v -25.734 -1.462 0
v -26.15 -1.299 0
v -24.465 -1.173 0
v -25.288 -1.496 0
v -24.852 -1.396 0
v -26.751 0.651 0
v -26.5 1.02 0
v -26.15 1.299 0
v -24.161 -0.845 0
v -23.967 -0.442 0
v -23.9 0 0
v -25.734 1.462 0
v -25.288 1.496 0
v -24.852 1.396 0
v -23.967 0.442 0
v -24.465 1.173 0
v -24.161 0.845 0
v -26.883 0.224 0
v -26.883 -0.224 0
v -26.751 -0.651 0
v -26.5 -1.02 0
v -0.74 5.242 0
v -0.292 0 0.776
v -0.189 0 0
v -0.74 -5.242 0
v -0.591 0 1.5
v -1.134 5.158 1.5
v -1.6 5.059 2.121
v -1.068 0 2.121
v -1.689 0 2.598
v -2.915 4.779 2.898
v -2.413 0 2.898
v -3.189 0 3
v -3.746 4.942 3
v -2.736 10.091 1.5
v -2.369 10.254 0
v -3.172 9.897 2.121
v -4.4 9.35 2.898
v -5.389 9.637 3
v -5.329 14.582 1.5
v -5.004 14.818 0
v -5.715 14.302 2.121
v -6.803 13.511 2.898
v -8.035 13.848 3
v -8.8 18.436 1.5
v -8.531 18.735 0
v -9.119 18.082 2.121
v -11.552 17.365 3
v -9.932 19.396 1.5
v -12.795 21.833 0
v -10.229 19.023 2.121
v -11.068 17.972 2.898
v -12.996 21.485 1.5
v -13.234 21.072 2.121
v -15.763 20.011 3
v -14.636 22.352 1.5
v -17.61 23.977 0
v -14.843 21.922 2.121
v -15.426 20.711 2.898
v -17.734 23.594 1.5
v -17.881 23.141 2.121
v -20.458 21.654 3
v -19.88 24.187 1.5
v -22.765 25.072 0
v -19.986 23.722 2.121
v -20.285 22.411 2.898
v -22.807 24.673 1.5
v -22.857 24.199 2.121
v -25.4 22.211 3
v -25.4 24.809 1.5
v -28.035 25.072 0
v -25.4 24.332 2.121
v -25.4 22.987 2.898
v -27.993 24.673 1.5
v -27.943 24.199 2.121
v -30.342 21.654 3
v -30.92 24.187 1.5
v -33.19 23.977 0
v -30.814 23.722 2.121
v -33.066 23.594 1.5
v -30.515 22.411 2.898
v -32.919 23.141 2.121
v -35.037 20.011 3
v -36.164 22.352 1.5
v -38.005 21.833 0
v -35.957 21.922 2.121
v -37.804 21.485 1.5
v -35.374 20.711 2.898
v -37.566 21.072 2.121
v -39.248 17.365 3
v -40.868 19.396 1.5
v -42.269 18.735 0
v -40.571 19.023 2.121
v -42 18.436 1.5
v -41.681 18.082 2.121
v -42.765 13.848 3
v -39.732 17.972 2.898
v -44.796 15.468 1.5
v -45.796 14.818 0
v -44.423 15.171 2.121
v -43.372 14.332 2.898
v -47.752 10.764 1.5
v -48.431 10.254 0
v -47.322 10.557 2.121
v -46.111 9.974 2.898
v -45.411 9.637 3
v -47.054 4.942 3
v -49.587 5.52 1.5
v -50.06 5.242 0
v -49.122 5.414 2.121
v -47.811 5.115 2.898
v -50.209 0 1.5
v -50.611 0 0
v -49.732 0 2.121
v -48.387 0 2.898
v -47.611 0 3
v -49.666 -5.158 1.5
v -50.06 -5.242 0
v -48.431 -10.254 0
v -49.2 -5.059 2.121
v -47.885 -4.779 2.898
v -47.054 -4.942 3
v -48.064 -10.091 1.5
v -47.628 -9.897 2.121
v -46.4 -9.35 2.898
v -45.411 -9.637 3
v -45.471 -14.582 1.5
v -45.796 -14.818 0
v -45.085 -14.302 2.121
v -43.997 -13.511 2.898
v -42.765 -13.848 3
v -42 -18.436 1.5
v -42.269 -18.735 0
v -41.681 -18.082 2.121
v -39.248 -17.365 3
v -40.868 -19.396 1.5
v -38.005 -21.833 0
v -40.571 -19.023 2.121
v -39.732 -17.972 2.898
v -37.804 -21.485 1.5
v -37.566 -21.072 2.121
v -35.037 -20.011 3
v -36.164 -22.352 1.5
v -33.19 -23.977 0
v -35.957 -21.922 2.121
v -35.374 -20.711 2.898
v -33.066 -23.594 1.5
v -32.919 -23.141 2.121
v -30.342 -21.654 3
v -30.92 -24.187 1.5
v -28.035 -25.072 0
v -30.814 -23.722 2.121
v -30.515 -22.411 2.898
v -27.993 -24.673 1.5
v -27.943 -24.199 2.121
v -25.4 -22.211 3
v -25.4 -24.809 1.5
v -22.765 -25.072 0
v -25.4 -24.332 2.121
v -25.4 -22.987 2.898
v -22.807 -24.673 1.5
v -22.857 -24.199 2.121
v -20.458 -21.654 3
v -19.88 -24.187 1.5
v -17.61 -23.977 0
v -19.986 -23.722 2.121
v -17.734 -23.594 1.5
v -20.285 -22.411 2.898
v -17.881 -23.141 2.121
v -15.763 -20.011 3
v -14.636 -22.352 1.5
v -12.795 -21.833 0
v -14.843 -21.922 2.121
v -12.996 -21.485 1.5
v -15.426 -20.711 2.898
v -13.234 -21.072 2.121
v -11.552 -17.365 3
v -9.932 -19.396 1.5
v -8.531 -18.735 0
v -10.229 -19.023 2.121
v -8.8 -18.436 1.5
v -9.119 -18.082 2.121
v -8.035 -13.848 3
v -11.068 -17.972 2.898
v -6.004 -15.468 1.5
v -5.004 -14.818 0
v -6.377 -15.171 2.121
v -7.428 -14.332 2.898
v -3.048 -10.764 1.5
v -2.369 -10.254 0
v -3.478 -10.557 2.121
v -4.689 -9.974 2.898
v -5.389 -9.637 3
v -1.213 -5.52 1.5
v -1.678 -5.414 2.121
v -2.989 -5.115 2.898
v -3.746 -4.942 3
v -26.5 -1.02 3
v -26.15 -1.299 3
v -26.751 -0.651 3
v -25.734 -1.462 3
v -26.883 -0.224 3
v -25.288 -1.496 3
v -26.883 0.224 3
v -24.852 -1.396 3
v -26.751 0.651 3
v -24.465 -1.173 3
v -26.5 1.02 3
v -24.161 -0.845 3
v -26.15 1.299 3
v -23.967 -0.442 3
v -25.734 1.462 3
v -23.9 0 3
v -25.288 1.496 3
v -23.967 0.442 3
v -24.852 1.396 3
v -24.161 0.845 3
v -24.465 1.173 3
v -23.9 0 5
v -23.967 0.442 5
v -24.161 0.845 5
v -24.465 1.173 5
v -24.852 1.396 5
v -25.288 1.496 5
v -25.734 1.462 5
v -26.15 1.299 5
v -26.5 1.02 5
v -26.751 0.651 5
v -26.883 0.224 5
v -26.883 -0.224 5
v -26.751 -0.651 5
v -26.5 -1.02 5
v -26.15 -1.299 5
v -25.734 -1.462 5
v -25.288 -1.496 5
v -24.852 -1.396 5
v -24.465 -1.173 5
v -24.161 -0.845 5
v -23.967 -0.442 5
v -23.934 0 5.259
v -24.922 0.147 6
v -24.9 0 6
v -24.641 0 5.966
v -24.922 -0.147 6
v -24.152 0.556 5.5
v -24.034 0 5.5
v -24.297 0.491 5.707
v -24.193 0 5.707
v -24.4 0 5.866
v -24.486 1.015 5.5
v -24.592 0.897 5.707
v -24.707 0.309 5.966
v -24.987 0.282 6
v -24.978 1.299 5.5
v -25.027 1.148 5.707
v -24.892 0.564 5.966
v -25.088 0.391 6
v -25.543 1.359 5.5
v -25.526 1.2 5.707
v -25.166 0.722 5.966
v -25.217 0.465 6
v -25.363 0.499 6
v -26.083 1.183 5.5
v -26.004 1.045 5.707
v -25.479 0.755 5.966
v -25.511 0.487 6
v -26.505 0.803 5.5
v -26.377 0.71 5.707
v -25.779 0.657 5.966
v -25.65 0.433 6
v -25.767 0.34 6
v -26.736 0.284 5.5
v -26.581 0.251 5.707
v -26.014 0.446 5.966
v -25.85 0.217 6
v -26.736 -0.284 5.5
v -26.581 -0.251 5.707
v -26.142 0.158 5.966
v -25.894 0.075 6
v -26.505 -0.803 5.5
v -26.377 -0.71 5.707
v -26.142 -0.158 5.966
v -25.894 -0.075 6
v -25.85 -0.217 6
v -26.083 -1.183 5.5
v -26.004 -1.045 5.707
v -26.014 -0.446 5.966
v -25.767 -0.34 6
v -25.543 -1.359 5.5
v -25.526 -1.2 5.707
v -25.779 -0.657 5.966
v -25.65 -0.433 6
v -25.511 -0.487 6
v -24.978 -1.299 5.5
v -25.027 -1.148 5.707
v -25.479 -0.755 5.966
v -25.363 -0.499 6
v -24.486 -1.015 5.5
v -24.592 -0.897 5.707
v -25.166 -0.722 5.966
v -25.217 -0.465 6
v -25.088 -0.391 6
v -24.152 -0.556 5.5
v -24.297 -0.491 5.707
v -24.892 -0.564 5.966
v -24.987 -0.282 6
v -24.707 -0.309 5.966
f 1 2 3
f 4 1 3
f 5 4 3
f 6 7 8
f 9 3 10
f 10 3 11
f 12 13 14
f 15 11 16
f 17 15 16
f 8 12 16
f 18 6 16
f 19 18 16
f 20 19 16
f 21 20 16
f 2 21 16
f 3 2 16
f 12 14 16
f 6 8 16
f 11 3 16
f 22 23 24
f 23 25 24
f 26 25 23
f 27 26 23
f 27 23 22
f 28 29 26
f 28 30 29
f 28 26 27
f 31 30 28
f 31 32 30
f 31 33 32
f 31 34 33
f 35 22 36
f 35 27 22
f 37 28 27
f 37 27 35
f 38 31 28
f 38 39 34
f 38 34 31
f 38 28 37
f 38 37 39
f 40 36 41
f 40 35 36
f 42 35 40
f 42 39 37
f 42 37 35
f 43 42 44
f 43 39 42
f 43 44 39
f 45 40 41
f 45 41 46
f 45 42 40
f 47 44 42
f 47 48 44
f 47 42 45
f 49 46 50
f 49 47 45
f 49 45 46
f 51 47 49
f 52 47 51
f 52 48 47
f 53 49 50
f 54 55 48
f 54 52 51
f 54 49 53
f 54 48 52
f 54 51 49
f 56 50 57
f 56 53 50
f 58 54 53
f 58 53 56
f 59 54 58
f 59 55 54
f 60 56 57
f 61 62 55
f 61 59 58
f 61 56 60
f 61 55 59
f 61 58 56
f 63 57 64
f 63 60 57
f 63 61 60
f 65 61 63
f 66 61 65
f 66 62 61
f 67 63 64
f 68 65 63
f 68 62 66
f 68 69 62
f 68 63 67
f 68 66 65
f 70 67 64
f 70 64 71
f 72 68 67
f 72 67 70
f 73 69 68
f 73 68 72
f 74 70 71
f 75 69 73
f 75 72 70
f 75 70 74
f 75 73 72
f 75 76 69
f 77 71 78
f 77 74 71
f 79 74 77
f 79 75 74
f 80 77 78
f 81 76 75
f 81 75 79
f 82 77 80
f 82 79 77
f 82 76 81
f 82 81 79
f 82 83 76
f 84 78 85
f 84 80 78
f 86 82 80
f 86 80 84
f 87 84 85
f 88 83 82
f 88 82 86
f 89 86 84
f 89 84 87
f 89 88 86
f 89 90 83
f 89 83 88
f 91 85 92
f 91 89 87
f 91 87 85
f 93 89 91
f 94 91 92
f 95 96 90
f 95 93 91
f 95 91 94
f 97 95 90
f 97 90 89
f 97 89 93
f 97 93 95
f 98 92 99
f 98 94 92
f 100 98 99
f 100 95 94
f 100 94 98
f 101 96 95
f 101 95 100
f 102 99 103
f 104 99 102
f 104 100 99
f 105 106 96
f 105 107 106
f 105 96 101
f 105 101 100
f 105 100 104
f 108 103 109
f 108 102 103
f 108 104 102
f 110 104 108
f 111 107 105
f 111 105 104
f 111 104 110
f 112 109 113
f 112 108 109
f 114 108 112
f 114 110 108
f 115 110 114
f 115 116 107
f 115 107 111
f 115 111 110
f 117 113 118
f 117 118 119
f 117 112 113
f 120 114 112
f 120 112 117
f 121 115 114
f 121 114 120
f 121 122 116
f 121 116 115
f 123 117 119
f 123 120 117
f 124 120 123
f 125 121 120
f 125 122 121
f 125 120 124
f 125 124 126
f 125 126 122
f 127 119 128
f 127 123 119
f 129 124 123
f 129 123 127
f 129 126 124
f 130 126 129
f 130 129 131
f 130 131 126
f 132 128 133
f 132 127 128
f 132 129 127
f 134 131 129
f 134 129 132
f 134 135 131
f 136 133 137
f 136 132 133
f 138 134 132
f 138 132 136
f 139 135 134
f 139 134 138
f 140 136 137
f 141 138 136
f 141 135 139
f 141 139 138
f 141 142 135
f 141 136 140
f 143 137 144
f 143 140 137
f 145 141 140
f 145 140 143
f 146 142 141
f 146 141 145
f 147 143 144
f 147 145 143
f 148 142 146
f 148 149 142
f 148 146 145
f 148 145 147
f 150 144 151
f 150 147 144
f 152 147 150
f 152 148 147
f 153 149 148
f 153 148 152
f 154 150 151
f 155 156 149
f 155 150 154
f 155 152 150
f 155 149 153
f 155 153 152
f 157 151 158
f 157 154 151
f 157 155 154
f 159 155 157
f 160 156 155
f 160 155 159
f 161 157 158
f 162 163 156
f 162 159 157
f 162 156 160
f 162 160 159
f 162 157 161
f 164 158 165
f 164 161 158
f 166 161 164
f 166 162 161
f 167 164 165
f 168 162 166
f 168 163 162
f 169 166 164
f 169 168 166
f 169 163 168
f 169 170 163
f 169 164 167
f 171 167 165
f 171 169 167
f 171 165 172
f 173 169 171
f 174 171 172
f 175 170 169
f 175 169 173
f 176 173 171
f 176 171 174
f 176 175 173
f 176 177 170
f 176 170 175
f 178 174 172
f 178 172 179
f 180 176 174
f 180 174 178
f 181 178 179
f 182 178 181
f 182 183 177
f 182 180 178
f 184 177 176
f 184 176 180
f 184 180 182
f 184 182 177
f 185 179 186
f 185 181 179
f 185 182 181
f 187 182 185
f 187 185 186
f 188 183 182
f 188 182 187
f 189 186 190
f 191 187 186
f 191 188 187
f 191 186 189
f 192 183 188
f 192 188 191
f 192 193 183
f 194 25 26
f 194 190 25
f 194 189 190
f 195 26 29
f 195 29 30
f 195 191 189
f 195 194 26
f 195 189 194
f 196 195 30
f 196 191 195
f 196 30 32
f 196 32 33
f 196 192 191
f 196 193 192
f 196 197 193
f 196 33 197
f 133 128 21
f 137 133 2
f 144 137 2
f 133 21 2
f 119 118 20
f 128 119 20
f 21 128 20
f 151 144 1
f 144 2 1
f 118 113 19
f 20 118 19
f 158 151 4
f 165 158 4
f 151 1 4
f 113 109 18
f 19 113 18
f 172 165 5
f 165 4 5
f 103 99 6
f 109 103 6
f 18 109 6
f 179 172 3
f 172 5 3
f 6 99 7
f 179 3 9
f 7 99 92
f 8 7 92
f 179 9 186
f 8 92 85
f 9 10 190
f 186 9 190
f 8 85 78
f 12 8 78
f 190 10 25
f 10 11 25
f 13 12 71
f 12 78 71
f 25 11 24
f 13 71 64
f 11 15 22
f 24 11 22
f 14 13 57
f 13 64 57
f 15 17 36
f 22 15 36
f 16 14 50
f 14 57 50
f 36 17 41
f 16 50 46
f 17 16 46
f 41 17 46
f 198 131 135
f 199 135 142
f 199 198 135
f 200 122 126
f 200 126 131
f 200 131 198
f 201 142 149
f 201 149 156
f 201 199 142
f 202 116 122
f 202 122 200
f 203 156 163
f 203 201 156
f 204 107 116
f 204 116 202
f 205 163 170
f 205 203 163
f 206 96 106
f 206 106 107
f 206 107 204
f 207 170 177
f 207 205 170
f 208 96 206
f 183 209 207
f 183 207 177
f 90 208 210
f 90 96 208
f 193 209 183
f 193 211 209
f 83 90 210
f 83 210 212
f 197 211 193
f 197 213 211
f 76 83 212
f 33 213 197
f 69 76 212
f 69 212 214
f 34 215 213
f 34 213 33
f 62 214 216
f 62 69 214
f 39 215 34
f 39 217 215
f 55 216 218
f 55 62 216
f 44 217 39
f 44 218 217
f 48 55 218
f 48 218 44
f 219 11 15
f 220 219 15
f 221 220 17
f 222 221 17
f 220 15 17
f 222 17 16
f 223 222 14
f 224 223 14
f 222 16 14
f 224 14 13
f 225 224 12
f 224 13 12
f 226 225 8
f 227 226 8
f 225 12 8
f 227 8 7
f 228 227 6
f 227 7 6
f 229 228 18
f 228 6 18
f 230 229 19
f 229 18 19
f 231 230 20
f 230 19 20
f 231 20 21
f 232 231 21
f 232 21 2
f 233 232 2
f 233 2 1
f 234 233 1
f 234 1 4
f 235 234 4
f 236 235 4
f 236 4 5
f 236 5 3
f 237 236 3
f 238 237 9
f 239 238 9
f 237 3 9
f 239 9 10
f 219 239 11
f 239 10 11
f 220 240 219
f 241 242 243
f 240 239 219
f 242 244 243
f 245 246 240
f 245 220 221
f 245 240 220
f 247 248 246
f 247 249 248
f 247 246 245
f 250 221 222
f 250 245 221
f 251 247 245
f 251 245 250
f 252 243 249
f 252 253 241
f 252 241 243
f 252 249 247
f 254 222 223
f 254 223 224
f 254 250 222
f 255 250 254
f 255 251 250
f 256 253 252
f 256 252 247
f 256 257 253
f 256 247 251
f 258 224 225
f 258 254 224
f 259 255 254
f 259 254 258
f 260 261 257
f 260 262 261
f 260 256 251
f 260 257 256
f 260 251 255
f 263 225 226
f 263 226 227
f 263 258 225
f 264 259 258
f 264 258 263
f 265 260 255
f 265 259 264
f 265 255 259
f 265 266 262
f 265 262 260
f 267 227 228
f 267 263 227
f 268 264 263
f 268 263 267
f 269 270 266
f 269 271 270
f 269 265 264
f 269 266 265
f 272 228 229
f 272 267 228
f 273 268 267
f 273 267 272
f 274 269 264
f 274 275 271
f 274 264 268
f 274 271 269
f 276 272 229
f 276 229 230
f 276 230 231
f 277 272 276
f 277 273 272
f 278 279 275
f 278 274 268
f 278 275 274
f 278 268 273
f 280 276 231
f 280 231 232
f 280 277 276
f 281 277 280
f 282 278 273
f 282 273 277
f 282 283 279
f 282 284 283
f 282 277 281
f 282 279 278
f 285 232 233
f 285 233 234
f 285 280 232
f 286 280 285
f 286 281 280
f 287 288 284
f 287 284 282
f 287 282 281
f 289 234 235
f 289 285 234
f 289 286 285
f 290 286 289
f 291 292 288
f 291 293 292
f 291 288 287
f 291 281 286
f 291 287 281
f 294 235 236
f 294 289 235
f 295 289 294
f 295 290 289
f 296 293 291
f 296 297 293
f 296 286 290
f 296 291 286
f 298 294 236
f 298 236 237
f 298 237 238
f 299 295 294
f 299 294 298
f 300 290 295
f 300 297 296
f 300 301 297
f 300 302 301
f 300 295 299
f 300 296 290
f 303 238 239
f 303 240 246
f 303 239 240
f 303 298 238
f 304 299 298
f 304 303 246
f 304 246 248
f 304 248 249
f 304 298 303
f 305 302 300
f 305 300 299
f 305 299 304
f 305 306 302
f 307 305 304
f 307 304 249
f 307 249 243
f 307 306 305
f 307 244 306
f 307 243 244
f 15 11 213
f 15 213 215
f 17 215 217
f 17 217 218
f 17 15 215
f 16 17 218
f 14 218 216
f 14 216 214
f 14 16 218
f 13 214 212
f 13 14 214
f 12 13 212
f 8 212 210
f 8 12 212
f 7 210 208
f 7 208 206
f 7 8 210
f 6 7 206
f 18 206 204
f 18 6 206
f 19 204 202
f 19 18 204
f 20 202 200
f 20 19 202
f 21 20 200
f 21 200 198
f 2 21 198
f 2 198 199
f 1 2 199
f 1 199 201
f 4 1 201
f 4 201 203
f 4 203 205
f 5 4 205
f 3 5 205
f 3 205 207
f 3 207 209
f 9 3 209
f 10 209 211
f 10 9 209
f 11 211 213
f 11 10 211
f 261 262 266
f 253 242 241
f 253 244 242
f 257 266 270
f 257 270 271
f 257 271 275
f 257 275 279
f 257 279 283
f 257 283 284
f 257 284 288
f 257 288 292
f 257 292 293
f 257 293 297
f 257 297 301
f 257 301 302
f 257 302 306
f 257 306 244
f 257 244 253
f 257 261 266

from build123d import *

# Parameters (mm, degrees)
F0_R     = 1.5
F1_DEPTH = 6
F0_R_2   = 25.2105248434
F2_DEPTH = 3
F3_R     = 1
F4_R     = 2.99999


# Not quite as in the source:
# - a fillet or chamfer is up to 0.001 mm smaller than in the source, because OpenCascade refuses the exact size
# - a feature names something its author has since deleted; it is built from what else it names


with BuildPart() as f1:
    # F0 (on Top) → F1 (new body)
    with BuildSketch(Plane.XY):
        with Locations((-25.4, 0)):
            Circle(F0_R)
    extrude(amount=F1_DEPTH)

    # F3
    f3_edges = [f1.edges().sort_by_distance(p)[0] for p in [
        (-26.9, 0, 6),
    ]]
    fillet(f3_edges, radius=F3_R)


with BuildPart() as f2:
    # F0 (on Top) → F2 (new body)
    with BuildSketch(Plane.XY):
        with Locations((-25.4, 0)):
            Circle(F0_R_2)
        with Locations((-25.4, 0)):
            Circle(F0_R, mode=Mode.SUBTRACT)
    extrude(amount=F2_DEPTH)

    # F4 (radius 3 in the source; OpenCascade refuses exactly that, so slightly less here)
    f4_edges = [f2.edges().sort_by_distance(p)[0] for p in [
        (-50.610525, 0, 3),
    ]]
    fillet(f4_edges, radius=F4_R)


solid = Compound([f1.part, f2.part])
